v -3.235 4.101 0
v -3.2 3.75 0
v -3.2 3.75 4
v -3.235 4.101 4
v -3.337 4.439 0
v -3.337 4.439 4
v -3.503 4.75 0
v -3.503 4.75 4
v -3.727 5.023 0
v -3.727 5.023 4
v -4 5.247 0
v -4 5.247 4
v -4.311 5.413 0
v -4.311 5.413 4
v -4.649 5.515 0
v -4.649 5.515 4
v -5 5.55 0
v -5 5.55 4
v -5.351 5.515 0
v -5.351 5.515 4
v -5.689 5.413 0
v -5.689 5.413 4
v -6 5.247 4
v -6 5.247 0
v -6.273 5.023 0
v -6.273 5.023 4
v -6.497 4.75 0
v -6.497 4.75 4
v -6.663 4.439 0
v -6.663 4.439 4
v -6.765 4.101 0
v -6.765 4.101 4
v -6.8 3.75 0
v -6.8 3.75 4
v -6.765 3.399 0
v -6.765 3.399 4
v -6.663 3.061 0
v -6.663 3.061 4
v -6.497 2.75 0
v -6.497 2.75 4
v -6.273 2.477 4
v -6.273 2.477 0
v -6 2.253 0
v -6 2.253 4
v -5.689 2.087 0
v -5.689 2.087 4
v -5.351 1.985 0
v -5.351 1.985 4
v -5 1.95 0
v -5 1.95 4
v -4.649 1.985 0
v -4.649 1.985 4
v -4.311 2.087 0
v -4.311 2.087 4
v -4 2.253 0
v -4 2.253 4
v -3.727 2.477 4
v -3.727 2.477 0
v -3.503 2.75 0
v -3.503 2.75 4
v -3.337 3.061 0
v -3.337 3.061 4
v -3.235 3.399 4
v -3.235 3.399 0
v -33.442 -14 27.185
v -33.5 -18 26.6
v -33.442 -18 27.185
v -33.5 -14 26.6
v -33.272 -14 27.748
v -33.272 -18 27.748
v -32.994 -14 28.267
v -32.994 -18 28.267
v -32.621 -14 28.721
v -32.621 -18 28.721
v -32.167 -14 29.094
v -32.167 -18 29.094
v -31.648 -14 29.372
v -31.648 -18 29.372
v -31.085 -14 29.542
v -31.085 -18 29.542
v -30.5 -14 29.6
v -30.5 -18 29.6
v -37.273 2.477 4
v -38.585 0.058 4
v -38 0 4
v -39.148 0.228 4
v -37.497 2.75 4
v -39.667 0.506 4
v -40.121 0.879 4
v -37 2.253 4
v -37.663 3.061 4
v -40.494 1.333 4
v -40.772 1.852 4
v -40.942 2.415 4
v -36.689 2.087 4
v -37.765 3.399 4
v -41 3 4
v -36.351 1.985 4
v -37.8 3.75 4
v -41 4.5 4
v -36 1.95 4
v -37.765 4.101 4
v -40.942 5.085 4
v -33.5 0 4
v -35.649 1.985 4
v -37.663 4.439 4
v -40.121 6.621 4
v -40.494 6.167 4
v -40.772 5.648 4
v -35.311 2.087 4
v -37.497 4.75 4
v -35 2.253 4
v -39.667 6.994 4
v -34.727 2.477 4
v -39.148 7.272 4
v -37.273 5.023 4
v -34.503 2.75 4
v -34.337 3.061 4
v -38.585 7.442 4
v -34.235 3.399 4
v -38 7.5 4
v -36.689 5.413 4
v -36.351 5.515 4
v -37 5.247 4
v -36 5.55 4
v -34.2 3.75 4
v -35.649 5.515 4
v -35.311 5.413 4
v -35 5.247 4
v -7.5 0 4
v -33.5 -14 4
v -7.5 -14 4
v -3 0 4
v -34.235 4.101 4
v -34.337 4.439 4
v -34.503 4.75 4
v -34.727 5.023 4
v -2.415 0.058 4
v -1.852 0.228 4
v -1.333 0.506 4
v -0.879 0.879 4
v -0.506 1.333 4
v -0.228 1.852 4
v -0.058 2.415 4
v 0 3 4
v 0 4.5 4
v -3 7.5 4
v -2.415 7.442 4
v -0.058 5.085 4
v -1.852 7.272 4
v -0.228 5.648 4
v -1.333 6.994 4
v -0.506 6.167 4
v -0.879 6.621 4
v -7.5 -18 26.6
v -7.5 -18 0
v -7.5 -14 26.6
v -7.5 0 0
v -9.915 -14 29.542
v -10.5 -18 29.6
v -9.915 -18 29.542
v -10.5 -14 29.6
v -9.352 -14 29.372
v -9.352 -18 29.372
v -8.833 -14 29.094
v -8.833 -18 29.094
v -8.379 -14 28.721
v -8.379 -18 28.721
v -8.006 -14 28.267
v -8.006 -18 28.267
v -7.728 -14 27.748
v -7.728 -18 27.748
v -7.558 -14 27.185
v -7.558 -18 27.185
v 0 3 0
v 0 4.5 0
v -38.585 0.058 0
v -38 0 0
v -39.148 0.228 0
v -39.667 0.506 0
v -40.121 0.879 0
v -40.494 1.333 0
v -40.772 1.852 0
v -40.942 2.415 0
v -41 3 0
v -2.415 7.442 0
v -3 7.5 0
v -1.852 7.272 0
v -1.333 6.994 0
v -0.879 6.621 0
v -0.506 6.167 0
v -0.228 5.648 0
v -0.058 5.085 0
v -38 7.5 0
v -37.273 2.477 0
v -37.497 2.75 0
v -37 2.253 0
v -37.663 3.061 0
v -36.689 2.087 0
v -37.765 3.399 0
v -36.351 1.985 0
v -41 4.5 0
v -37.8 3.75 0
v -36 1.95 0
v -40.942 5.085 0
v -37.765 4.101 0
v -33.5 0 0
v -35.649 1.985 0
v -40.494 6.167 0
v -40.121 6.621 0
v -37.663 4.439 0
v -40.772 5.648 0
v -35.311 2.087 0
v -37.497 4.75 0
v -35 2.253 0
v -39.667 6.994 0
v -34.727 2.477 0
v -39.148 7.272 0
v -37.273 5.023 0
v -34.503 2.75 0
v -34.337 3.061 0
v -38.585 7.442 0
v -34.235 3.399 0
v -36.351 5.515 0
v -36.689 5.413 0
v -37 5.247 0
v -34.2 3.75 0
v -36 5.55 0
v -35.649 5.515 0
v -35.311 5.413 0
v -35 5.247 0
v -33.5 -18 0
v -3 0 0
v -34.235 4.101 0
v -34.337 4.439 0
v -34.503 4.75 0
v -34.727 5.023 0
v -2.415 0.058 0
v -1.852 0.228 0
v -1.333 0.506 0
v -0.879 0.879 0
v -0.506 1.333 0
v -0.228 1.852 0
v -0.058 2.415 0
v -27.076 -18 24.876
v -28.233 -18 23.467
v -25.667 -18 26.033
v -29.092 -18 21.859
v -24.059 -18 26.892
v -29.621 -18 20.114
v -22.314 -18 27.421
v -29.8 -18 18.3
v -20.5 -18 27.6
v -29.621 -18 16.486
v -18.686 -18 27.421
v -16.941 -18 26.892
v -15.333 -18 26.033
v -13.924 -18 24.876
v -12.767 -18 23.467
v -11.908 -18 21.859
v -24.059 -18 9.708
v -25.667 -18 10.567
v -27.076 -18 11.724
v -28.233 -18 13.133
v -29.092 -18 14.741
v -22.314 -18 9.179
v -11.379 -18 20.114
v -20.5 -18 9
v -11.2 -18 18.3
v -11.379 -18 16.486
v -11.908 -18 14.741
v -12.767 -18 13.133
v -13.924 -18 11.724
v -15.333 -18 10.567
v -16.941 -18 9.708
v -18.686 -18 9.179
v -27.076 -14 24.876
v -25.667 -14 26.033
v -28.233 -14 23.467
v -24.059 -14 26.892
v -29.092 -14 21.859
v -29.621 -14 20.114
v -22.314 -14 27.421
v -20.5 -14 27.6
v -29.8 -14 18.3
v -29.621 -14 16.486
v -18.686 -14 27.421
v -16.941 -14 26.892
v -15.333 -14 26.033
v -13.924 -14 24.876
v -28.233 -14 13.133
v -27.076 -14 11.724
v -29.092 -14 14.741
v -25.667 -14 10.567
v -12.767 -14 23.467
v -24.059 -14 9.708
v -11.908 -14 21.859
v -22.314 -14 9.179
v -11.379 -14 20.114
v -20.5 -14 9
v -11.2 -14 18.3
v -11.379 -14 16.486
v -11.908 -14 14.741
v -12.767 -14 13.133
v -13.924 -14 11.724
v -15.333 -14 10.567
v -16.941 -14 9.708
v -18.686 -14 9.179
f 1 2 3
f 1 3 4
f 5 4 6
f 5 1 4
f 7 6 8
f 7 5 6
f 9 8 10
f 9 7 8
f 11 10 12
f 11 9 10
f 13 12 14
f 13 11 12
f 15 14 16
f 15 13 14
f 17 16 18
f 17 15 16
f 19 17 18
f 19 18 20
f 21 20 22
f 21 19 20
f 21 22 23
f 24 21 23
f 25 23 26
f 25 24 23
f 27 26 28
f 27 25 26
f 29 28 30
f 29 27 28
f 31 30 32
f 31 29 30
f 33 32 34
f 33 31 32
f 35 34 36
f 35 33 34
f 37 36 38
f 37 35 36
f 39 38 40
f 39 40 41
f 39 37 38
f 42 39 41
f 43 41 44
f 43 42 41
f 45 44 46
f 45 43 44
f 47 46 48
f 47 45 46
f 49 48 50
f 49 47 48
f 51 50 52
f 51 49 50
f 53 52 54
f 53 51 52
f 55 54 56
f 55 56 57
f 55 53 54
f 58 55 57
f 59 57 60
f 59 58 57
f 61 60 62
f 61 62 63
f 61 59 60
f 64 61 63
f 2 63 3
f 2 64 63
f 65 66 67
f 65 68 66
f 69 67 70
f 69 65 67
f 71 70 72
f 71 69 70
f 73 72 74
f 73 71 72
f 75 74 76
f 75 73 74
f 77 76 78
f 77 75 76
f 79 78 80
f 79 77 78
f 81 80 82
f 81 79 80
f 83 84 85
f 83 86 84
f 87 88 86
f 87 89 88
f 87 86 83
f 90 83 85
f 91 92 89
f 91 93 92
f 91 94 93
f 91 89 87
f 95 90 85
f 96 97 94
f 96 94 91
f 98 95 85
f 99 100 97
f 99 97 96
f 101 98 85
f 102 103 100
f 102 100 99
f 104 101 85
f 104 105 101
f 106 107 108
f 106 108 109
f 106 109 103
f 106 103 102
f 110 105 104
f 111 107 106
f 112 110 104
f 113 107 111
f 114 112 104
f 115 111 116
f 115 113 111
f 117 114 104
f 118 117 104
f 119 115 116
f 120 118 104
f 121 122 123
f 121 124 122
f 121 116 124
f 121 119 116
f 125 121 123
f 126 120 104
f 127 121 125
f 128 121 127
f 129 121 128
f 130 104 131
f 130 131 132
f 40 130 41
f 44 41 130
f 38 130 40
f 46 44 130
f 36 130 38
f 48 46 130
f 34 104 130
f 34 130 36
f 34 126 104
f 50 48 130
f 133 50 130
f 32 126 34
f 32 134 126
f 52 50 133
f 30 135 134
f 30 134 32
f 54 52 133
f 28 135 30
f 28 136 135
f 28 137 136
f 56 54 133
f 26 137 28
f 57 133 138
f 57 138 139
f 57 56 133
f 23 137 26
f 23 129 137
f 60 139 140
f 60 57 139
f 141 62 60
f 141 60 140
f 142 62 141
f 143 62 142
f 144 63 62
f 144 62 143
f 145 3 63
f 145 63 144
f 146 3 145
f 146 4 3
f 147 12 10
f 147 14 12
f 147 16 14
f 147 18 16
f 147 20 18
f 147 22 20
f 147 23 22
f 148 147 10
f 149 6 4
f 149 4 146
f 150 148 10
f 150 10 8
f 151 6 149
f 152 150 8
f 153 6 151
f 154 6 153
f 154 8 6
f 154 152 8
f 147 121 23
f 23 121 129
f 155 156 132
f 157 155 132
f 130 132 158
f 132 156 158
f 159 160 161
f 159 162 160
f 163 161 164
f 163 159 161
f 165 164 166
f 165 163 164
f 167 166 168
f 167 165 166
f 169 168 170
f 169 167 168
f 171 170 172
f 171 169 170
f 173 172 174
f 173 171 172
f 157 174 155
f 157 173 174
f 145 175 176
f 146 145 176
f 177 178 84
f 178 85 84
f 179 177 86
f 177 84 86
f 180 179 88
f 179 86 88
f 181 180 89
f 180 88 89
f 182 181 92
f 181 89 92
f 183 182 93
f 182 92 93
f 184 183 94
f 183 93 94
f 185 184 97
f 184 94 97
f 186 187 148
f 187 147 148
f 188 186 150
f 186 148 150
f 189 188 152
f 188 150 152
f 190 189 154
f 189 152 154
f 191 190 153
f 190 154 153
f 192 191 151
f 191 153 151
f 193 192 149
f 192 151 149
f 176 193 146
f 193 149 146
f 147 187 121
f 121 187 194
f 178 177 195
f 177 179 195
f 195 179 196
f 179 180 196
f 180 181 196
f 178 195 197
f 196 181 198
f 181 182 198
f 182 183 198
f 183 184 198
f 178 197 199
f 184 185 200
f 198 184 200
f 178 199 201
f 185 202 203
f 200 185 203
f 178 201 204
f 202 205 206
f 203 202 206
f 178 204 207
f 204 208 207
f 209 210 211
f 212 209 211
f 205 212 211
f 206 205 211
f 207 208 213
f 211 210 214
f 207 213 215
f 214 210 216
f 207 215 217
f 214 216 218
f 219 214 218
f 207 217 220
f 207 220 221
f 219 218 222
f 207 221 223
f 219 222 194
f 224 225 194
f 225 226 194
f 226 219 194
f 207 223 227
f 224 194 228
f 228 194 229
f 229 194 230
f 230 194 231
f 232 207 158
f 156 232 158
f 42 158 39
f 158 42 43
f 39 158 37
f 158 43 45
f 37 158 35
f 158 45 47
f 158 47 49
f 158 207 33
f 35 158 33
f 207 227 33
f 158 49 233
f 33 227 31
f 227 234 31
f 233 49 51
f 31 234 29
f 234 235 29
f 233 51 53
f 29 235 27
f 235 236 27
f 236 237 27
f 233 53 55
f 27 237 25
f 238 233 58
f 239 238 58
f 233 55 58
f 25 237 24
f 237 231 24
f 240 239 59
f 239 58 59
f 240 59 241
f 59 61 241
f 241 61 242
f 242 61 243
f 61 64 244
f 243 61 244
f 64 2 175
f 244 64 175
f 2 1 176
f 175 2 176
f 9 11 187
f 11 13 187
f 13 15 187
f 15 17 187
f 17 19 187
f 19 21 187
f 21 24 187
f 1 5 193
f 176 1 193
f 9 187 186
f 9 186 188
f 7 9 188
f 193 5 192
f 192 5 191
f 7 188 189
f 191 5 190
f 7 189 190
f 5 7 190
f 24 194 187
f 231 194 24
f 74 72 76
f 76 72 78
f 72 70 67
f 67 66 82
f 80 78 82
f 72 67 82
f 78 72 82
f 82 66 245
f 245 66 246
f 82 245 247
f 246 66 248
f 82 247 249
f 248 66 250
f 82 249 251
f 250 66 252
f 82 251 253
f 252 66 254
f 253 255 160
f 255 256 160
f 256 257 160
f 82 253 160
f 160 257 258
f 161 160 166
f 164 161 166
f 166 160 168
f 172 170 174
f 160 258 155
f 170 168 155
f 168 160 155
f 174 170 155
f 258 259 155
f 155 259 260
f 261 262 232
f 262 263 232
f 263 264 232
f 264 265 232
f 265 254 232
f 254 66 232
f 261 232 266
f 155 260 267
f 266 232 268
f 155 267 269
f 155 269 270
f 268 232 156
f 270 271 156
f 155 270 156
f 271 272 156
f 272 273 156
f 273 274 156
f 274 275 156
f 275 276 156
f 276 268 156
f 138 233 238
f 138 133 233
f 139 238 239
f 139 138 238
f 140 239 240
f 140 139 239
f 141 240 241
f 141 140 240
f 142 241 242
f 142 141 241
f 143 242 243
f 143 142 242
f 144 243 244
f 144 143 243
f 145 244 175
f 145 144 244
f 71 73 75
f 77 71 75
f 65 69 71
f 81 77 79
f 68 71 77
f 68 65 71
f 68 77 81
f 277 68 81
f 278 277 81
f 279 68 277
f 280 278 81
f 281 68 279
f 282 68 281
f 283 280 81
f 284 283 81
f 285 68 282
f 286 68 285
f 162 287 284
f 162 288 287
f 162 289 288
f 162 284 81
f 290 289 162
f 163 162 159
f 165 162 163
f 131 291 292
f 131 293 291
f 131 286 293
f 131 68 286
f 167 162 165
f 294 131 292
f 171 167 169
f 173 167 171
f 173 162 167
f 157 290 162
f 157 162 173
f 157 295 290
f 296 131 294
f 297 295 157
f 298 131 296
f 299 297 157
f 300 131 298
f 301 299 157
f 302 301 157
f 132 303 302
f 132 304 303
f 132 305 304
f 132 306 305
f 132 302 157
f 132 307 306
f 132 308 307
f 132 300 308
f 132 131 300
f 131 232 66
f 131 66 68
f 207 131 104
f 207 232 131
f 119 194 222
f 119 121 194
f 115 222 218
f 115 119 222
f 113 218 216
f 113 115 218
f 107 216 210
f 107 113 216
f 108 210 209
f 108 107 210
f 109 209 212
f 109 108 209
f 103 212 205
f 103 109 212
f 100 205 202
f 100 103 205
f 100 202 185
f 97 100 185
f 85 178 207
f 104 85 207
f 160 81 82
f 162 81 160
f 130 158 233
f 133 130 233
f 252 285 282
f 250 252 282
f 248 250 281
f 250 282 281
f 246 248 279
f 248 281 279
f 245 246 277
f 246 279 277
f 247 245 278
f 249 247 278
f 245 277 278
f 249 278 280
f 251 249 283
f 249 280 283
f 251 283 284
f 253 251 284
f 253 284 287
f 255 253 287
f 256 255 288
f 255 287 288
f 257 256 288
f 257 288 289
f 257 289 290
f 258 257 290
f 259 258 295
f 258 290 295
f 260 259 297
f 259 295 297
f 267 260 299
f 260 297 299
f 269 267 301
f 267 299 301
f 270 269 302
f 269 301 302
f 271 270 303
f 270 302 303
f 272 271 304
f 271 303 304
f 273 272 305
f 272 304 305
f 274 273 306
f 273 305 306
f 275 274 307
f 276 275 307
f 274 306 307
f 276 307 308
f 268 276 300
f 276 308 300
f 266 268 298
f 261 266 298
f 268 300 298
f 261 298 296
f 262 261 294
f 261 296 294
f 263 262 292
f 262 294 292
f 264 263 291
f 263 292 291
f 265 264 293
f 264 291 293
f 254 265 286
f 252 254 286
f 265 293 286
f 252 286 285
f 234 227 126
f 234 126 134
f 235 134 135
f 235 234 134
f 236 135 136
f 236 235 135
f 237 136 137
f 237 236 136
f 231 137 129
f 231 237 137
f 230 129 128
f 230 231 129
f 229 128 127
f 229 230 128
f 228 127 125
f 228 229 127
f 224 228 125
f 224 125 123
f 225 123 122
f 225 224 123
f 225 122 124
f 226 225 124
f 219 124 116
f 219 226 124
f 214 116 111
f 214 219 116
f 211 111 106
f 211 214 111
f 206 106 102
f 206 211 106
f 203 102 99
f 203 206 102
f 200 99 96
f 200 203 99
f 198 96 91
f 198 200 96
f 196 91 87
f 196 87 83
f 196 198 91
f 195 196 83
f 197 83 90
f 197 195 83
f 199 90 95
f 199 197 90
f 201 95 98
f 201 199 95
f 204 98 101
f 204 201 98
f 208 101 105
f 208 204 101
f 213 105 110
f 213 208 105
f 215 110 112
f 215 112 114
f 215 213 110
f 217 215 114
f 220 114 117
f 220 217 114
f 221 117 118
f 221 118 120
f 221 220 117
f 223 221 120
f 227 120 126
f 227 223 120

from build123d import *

# Parameters (mm, degrees)
F0_R     = 1.8
F0_W     = 26
F0_H     = 14
F1_DEPTH = 4
F0_H_2   = 4
F2_DEPTH = 29.6
F3_R     = 9.3
F4_DEPTH = 4
F5_R     = 3


with BuildPart() as f1:
    # F0 (on Top) → F1 (new body)
    with BuildSketch(Plane.XY):
        Polygon((0, 7.5), (-41, 7.5), (-41, 0), (-33.5, 0), (-7.5, 0), (0, 0), align=None)
        with Locations((-36, 3.75)):
            Circle(F0_R, mode=Mode.SUBTRACT)
        with Locations((-5, 3.75)):
            Circle(F0_R, mode=Mode.SUBTRACT)
        with Locations((-20.5, -7)):
            Rectangle(F0_W, F0_H)
    extrude(amount=F1_DEPTH)

    # F0 (on Top) → F2 (join)
    with BuildSketch(Plane.XY):
        with Locations((-20.5, -16)):
            Rectangle(F0_W, F0_H_2)
    extrude(amount=F2_DEPTH)

    # F3 (on face) → F4 (cut, through all)
    with BuildSketch(Plane(origin=(0, -14, 0), x_dir=(-1, 0, 0), z_dir=(0, 1, 0))):
        with Locations((20.5, 18.3)):
            Circle(F3_R)
    extrude(amount=-F4_DEPTH, mode=Mode.SUBTRACT)

    # F5
    f5_edges = [f1.edges().sort_by_distance(p)[0] for p in [
        (0, 0, 2),
        (0, 7.5, 2),
        (-41, 0, 2),
        (-41, 7.5, 2),
        (-33.5, -16, 29.6),
        (-7.5, -16, 29.6),
    ]]
    fillet(f5_edges, radius=F5_R)


solid = f1.part
